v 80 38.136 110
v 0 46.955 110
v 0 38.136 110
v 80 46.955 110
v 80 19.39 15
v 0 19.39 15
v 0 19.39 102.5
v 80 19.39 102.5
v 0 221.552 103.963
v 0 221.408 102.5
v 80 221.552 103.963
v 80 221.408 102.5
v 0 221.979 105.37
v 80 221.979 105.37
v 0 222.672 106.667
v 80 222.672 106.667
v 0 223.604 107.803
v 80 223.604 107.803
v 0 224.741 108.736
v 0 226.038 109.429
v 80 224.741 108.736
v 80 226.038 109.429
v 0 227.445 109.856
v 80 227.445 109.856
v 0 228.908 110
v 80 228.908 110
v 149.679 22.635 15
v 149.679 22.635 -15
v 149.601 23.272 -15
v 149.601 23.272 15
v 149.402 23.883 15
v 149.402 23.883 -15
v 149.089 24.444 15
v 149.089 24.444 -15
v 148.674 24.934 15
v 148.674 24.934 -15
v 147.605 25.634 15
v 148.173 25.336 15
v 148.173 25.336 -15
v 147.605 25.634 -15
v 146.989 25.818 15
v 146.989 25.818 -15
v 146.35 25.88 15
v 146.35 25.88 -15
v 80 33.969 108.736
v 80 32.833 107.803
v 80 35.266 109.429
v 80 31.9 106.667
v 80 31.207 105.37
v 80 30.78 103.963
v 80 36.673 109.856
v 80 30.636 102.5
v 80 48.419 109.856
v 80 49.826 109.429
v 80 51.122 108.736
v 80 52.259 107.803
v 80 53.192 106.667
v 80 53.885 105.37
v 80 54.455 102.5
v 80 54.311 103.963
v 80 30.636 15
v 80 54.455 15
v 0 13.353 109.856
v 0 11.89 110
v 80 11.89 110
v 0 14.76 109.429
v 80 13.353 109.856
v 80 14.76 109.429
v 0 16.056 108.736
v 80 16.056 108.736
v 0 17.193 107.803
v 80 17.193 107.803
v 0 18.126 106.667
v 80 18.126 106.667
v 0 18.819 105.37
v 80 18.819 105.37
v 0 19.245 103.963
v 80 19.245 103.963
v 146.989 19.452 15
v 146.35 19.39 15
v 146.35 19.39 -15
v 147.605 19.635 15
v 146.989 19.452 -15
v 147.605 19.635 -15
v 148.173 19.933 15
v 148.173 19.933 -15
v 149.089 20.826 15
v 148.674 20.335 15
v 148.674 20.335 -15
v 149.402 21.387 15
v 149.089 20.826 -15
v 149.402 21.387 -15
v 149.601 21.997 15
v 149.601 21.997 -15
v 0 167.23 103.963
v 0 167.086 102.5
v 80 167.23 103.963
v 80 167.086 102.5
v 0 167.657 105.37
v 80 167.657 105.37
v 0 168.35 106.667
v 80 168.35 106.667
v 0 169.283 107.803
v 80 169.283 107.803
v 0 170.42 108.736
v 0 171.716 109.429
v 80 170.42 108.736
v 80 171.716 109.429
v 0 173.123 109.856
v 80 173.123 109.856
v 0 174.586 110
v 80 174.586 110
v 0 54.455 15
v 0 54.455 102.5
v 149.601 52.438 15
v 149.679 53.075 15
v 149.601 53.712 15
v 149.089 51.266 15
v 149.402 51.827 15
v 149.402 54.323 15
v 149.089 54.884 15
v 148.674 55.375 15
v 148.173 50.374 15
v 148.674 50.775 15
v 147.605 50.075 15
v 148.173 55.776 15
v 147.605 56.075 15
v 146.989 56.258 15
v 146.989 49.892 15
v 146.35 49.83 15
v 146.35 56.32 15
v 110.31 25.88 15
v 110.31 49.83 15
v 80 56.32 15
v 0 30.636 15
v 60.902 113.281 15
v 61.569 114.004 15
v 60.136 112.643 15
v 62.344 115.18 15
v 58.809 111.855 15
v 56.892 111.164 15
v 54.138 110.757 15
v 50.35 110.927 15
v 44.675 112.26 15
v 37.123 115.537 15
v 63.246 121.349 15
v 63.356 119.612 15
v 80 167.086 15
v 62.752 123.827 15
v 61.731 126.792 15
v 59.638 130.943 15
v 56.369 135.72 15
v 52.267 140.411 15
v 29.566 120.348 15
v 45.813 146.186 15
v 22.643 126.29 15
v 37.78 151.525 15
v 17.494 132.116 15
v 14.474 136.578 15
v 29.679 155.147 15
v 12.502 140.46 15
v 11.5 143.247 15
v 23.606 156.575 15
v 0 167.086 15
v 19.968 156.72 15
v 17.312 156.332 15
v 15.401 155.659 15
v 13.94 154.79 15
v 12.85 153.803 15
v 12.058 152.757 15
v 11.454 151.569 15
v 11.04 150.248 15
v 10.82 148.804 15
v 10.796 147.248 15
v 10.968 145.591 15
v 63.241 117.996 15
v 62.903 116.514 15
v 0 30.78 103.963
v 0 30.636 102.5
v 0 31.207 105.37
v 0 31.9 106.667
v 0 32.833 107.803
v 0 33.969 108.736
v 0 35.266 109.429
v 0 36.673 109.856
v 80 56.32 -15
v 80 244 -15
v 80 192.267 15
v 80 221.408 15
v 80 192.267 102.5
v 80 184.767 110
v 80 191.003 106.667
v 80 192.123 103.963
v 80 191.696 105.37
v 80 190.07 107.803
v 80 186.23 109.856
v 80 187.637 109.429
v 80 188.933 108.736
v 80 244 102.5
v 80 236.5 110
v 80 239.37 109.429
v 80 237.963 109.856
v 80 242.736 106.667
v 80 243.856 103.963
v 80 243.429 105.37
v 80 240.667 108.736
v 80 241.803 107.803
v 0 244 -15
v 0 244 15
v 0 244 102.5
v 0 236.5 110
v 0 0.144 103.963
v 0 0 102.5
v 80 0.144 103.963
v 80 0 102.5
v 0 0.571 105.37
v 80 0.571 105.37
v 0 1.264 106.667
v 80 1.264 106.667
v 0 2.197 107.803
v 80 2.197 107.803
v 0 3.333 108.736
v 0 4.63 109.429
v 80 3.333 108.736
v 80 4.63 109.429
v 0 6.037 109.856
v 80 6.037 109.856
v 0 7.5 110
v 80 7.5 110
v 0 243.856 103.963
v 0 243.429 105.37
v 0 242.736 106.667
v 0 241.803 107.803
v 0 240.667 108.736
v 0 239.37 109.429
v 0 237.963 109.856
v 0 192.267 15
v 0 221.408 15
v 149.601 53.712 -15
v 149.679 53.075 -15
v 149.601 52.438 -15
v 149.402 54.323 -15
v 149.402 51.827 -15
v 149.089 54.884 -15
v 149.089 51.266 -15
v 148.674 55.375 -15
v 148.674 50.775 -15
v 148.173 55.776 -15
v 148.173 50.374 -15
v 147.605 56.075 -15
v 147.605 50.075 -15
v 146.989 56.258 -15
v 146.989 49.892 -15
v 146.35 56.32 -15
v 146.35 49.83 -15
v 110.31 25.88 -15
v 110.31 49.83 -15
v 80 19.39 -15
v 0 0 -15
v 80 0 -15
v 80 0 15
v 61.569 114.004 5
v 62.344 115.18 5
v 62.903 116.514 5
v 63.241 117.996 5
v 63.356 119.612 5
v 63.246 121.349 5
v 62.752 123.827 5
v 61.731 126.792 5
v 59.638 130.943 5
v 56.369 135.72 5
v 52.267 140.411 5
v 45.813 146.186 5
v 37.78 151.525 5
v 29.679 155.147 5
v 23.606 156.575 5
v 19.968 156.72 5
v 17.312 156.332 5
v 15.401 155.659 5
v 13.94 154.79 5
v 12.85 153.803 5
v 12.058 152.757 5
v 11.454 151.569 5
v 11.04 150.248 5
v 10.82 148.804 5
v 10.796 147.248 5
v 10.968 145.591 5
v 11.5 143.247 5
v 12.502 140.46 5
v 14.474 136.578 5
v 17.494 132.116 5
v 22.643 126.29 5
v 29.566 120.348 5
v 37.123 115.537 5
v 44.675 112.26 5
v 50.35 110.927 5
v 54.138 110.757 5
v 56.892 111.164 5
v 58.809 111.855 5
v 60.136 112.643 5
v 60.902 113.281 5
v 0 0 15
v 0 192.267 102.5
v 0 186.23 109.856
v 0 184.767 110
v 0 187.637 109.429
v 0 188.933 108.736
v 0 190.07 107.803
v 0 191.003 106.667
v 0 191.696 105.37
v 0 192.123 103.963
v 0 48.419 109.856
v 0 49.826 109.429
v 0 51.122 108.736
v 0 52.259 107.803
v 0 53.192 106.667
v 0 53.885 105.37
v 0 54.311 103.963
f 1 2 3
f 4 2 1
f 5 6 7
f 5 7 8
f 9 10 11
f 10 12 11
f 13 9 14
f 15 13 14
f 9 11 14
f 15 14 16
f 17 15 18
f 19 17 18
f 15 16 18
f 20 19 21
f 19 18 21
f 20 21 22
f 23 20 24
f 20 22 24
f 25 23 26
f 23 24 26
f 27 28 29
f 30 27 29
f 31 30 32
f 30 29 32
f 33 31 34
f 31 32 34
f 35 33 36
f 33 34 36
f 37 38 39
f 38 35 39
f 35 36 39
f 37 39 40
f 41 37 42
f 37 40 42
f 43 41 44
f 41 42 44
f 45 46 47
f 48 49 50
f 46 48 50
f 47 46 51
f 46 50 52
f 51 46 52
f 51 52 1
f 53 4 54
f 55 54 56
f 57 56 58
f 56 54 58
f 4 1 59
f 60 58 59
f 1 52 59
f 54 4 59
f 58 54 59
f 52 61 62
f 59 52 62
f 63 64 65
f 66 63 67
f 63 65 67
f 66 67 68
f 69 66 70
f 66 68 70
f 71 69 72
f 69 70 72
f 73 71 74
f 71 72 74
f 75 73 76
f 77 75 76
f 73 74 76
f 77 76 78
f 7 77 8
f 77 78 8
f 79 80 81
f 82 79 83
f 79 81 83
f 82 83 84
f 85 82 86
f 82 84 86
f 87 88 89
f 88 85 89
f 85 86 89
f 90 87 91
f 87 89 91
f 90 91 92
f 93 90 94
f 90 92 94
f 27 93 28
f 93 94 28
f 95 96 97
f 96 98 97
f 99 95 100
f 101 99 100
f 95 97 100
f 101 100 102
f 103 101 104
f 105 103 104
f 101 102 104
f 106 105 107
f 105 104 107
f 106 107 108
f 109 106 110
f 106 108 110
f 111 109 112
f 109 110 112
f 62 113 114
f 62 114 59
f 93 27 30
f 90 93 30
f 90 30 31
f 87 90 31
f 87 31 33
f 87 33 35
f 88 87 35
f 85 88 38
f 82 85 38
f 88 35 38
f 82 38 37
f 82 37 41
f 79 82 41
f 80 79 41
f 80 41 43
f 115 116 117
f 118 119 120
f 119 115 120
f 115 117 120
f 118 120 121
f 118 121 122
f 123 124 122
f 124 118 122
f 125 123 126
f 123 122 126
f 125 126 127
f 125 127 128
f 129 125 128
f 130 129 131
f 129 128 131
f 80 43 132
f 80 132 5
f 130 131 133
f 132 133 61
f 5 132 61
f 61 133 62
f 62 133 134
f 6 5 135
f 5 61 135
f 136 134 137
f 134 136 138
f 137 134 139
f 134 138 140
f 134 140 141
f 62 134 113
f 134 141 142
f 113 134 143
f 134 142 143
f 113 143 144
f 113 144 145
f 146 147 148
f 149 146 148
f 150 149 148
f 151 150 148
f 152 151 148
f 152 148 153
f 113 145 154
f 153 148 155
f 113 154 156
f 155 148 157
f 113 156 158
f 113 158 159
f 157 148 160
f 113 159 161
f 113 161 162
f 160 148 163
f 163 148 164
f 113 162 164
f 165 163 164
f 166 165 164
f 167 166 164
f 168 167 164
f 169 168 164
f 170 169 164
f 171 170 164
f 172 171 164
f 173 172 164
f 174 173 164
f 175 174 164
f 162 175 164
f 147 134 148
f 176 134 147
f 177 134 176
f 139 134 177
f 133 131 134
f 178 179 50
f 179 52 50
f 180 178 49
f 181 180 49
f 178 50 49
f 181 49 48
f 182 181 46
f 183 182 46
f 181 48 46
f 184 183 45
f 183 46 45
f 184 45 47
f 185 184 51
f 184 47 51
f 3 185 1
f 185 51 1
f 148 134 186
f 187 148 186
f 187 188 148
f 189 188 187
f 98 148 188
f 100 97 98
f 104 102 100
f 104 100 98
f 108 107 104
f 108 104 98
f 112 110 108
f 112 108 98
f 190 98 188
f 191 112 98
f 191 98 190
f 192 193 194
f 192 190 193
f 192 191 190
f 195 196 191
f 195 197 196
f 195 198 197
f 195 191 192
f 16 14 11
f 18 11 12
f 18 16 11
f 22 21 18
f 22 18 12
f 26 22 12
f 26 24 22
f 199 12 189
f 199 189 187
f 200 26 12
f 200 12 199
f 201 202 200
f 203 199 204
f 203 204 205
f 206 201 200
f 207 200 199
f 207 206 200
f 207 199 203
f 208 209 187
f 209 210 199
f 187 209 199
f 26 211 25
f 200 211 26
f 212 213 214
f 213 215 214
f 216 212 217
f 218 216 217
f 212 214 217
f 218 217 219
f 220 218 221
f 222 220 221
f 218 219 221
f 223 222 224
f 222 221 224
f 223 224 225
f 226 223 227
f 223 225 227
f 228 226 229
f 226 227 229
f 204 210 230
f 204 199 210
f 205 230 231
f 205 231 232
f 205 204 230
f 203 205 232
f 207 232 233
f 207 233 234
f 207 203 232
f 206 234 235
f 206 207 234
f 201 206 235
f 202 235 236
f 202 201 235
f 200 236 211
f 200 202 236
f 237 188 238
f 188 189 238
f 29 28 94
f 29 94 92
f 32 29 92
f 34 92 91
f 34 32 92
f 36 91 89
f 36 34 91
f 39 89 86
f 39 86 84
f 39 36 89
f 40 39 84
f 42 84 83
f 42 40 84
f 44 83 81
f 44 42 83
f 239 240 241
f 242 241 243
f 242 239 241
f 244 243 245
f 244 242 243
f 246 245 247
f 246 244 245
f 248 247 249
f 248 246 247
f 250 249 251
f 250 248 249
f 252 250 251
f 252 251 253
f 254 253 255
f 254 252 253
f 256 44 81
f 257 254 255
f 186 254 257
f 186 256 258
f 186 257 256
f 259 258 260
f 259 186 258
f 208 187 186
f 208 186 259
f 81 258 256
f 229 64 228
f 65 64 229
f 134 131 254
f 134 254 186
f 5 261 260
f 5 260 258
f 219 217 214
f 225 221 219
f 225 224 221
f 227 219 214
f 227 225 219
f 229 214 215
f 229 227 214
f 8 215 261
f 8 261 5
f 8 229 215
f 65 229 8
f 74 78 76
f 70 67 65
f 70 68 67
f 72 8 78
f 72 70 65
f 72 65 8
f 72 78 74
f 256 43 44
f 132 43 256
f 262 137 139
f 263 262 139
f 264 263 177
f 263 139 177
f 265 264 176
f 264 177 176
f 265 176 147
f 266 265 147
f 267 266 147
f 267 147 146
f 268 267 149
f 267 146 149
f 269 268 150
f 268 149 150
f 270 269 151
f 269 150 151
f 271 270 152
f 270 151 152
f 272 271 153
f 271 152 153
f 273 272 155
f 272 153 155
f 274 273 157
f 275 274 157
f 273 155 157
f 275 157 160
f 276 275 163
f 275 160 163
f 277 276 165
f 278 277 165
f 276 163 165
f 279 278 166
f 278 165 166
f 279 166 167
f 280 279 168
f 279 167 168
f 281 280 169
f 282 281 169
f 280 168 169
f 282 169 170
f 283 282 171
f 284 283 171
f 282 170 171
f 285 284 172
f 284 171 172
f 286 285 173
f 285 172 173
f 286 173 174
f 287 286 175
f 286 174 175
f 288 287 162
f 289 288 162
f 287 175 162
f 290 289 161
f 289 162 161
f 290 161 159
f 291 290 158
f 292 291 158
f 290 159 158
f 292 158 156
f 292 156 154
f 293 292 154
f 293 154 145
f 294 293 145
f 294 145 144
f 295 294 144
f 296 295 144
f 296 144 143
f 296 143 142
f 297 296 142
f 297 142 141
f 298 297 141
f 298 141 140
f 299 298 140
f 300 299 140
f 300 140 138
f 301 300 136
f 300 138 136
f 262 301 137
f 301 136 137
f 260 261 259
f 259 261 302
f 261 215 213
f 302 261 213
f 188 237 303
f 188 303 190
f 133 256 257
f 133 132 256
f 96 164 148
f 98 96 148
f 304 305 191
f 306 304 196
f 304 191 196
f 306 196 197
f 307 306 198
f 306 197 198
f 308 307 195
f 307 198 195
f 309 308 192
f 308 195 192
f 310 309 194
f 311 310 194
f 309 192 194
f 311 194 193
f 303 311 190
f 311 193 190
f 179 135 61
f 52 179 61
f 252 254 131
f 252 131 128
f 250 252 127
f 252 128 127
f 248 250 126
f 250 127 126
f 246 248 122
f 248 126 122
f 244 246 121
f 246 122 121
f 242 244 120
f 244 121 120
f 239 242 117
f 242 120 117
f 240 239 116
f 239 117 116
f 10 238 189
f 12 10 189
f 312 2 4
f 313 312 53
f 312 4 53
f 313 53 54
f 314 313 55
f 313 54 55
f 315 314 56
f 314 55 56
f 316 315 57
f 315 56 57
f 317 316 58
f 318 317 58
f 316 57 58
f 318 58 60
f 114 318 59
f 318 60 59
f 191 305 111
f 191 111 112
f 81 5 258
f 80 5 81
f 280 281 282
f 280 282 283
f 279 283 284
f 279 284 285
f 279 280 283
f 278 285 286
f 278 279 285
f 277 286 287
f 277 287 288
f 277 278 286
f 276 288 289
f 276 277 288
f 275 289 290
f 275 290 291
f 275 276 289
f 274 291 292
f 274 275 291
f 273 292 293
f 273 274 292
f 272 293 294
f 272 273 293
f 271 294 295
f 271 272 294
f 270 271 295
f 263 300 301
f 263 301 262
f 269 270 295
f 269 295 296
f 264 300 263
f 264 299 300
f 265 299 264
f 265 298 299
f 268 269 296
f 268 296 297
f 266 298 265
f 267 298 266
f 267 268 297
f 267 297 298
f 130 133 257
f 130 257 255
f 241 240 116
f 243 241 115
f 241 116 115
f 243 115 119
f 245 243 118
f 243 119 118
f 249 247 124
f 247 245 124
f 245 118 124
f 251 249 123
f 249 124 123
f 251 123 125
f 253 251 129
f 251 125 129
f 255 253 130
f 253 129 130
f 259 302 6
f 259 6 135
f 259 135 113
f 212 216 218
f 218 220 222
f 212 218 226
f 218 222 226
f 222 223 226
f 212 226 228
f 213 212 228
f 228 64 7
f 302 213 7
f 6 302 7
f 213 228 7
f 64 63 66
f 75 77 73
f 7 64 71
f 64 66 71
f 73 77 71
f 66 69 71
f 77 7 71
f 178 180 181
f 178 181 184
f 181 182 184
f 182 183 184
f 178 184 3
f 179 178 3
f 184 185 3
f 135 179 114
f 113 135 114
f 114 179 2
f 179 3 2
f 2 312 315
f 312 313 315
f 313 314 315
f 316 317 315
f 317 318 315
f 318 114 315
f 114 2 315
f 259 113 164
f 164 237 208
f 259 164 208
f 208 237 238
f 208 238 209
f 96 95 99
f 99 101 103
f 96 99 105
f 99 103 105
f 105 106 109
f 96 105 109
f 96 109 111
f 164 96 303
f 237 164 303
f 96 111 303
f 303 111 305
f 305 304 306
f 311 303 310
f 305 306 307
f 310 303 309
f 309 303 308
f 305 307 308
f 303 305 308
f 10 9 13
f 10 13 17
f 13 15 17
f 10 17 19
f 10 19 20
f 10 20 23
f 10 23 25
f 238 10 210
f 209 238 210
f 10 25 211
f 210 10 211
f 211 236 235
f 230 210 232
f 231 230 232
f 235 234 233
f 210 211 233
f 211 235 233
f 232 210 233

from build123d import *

# Parameters (mm, degrees)
BOSS_EXTRUDE2_DEPTH = 15
FILLET1_R           = 3.33
SKETCH3_W           = 80
SKETCH3_H           = 22.592249713
BOSS_EXTRUDE3_DEPTH = 110
SKETCH4_W           = 80
SKETCH4_H           = 25.180318724
SKETCH4_H_2         = 19.389592809
SKETCH4_H_3         = 23.819220414
BOSS_EXTRUDE4_DEPTH = 110
FILLET2_R           = 7.5
SKETCH5_RX          = 31.460220339
SKETCH5_RY          = 15.185408179
CUT_EXTRUDE1_DEPTH  = 10


with BuildPart() as part:
    # Sketch2 → Boss-Extrude2 (new, symmetric)
    with BuildSketch(Plane.XY):
        Polygon((80, 244), (80, 56.32), (80, 0), (0, 0), (0, 244), align=None)
        Polygon((149.68, 56.32), (80, 56.32), (80, 19.389592809), (149.68, 19.389592809), (149.68, 25.879592809), (110.31, 25.879592809), (110.31, 49.83), (149.68, 49.83), align=None)
    extrude(amount=BOSS_EXTRUDE2_DEPTH, both=True)

    # Fillet1
    # the kernel refuses this fillet: 3.33 mm, written as the material it takes off along each edge
    with BuildSketch(Plane(origin=(149.68, 19.389592809, -23.325), x_dir=(-1, 0, 0), z_dir=(0, 0, 1)), Plane(origin=(149.68, 25.879592809, -23.325), x_dir=(0, -1, 0), z_dir=(0, 0, 1)), Plane(origin=(149.68, 49.83, 23.325), x_dir=(0, 1, 0), z_dir=(0, 0, -1)), Plane(origin=(149.68, 56.32, 23.325), x_dir=(-1, 0, 0), z_dir=(0, 0, -1))) as fillet1_piece_1:
        with BuildLine():
            CenterArc((FILLET1_R, -FILLET1_R), FILLET1_R, 90, 90)
            Line((0, -FILLET1_R), (0, 0))
            Line((0, 0), (FILLET1_R, 0))
        make_face()
    extrude(amount=46.65, mode=Mode.SUBTRACT)

    # Sketch3 → Boss-Extrude3 (add)
    with BuildSketch(Plane.XY):
        with Locations((40, 232.703875144)):
            Rectangle(SKETCH3_W, SKETCH3_H)
    extrude(amount=BOSS_EXTRUDE3_DEPTH)

    # Sketch4 → Boss-Extrude4 (add)
    with BuildSketch(Plane.XY):
        with Locations((40, 179.676540861)):
            Rectangle(SKETCH4_W, SKETCH4_H)
        with Locations((40, 9.694796404)):
            Rectangle(SKETCH4_W, SKETCH4_H_2)
        with Locations((40, 42.545886188)):
            Rectangle(SKETCH4_W, SKETCH4_H_3)
    extrude(amount=BOSS_EXTRUDE4_DEPTH)

    # Fillet2
    fillet2_edges = [part.edges().sort_by_distance(p)[0] for p in [
        (40, 167.086381499, 110),
        (40, 192.266700223, 110),
        (40, 0, 110),
        (40, 19.389592809, 110),
        (40, 30.636275981, 110),
        (40, 54.455496395, 110),
        (40, 221.407750287, 110),
        (40, 244, 110),
    ]]
    fillet(fillet2_edges, radius=FILLET2_R)

    # Sketch5 → Cut-Extrude1 (cut)
    with BuildSketch(Plane.XY.offset(15)):
        with Locations(Location((37.068979408, 133.739472919), (0, 0, -38.85337434))):
            Ellipse(SKETCH5_RX, SKETCH5_RY)
    extrude(amount=-CUT_EXTRUDE1_DEPTH, mode=Mode.SUBTRACT)


solid = part.part
